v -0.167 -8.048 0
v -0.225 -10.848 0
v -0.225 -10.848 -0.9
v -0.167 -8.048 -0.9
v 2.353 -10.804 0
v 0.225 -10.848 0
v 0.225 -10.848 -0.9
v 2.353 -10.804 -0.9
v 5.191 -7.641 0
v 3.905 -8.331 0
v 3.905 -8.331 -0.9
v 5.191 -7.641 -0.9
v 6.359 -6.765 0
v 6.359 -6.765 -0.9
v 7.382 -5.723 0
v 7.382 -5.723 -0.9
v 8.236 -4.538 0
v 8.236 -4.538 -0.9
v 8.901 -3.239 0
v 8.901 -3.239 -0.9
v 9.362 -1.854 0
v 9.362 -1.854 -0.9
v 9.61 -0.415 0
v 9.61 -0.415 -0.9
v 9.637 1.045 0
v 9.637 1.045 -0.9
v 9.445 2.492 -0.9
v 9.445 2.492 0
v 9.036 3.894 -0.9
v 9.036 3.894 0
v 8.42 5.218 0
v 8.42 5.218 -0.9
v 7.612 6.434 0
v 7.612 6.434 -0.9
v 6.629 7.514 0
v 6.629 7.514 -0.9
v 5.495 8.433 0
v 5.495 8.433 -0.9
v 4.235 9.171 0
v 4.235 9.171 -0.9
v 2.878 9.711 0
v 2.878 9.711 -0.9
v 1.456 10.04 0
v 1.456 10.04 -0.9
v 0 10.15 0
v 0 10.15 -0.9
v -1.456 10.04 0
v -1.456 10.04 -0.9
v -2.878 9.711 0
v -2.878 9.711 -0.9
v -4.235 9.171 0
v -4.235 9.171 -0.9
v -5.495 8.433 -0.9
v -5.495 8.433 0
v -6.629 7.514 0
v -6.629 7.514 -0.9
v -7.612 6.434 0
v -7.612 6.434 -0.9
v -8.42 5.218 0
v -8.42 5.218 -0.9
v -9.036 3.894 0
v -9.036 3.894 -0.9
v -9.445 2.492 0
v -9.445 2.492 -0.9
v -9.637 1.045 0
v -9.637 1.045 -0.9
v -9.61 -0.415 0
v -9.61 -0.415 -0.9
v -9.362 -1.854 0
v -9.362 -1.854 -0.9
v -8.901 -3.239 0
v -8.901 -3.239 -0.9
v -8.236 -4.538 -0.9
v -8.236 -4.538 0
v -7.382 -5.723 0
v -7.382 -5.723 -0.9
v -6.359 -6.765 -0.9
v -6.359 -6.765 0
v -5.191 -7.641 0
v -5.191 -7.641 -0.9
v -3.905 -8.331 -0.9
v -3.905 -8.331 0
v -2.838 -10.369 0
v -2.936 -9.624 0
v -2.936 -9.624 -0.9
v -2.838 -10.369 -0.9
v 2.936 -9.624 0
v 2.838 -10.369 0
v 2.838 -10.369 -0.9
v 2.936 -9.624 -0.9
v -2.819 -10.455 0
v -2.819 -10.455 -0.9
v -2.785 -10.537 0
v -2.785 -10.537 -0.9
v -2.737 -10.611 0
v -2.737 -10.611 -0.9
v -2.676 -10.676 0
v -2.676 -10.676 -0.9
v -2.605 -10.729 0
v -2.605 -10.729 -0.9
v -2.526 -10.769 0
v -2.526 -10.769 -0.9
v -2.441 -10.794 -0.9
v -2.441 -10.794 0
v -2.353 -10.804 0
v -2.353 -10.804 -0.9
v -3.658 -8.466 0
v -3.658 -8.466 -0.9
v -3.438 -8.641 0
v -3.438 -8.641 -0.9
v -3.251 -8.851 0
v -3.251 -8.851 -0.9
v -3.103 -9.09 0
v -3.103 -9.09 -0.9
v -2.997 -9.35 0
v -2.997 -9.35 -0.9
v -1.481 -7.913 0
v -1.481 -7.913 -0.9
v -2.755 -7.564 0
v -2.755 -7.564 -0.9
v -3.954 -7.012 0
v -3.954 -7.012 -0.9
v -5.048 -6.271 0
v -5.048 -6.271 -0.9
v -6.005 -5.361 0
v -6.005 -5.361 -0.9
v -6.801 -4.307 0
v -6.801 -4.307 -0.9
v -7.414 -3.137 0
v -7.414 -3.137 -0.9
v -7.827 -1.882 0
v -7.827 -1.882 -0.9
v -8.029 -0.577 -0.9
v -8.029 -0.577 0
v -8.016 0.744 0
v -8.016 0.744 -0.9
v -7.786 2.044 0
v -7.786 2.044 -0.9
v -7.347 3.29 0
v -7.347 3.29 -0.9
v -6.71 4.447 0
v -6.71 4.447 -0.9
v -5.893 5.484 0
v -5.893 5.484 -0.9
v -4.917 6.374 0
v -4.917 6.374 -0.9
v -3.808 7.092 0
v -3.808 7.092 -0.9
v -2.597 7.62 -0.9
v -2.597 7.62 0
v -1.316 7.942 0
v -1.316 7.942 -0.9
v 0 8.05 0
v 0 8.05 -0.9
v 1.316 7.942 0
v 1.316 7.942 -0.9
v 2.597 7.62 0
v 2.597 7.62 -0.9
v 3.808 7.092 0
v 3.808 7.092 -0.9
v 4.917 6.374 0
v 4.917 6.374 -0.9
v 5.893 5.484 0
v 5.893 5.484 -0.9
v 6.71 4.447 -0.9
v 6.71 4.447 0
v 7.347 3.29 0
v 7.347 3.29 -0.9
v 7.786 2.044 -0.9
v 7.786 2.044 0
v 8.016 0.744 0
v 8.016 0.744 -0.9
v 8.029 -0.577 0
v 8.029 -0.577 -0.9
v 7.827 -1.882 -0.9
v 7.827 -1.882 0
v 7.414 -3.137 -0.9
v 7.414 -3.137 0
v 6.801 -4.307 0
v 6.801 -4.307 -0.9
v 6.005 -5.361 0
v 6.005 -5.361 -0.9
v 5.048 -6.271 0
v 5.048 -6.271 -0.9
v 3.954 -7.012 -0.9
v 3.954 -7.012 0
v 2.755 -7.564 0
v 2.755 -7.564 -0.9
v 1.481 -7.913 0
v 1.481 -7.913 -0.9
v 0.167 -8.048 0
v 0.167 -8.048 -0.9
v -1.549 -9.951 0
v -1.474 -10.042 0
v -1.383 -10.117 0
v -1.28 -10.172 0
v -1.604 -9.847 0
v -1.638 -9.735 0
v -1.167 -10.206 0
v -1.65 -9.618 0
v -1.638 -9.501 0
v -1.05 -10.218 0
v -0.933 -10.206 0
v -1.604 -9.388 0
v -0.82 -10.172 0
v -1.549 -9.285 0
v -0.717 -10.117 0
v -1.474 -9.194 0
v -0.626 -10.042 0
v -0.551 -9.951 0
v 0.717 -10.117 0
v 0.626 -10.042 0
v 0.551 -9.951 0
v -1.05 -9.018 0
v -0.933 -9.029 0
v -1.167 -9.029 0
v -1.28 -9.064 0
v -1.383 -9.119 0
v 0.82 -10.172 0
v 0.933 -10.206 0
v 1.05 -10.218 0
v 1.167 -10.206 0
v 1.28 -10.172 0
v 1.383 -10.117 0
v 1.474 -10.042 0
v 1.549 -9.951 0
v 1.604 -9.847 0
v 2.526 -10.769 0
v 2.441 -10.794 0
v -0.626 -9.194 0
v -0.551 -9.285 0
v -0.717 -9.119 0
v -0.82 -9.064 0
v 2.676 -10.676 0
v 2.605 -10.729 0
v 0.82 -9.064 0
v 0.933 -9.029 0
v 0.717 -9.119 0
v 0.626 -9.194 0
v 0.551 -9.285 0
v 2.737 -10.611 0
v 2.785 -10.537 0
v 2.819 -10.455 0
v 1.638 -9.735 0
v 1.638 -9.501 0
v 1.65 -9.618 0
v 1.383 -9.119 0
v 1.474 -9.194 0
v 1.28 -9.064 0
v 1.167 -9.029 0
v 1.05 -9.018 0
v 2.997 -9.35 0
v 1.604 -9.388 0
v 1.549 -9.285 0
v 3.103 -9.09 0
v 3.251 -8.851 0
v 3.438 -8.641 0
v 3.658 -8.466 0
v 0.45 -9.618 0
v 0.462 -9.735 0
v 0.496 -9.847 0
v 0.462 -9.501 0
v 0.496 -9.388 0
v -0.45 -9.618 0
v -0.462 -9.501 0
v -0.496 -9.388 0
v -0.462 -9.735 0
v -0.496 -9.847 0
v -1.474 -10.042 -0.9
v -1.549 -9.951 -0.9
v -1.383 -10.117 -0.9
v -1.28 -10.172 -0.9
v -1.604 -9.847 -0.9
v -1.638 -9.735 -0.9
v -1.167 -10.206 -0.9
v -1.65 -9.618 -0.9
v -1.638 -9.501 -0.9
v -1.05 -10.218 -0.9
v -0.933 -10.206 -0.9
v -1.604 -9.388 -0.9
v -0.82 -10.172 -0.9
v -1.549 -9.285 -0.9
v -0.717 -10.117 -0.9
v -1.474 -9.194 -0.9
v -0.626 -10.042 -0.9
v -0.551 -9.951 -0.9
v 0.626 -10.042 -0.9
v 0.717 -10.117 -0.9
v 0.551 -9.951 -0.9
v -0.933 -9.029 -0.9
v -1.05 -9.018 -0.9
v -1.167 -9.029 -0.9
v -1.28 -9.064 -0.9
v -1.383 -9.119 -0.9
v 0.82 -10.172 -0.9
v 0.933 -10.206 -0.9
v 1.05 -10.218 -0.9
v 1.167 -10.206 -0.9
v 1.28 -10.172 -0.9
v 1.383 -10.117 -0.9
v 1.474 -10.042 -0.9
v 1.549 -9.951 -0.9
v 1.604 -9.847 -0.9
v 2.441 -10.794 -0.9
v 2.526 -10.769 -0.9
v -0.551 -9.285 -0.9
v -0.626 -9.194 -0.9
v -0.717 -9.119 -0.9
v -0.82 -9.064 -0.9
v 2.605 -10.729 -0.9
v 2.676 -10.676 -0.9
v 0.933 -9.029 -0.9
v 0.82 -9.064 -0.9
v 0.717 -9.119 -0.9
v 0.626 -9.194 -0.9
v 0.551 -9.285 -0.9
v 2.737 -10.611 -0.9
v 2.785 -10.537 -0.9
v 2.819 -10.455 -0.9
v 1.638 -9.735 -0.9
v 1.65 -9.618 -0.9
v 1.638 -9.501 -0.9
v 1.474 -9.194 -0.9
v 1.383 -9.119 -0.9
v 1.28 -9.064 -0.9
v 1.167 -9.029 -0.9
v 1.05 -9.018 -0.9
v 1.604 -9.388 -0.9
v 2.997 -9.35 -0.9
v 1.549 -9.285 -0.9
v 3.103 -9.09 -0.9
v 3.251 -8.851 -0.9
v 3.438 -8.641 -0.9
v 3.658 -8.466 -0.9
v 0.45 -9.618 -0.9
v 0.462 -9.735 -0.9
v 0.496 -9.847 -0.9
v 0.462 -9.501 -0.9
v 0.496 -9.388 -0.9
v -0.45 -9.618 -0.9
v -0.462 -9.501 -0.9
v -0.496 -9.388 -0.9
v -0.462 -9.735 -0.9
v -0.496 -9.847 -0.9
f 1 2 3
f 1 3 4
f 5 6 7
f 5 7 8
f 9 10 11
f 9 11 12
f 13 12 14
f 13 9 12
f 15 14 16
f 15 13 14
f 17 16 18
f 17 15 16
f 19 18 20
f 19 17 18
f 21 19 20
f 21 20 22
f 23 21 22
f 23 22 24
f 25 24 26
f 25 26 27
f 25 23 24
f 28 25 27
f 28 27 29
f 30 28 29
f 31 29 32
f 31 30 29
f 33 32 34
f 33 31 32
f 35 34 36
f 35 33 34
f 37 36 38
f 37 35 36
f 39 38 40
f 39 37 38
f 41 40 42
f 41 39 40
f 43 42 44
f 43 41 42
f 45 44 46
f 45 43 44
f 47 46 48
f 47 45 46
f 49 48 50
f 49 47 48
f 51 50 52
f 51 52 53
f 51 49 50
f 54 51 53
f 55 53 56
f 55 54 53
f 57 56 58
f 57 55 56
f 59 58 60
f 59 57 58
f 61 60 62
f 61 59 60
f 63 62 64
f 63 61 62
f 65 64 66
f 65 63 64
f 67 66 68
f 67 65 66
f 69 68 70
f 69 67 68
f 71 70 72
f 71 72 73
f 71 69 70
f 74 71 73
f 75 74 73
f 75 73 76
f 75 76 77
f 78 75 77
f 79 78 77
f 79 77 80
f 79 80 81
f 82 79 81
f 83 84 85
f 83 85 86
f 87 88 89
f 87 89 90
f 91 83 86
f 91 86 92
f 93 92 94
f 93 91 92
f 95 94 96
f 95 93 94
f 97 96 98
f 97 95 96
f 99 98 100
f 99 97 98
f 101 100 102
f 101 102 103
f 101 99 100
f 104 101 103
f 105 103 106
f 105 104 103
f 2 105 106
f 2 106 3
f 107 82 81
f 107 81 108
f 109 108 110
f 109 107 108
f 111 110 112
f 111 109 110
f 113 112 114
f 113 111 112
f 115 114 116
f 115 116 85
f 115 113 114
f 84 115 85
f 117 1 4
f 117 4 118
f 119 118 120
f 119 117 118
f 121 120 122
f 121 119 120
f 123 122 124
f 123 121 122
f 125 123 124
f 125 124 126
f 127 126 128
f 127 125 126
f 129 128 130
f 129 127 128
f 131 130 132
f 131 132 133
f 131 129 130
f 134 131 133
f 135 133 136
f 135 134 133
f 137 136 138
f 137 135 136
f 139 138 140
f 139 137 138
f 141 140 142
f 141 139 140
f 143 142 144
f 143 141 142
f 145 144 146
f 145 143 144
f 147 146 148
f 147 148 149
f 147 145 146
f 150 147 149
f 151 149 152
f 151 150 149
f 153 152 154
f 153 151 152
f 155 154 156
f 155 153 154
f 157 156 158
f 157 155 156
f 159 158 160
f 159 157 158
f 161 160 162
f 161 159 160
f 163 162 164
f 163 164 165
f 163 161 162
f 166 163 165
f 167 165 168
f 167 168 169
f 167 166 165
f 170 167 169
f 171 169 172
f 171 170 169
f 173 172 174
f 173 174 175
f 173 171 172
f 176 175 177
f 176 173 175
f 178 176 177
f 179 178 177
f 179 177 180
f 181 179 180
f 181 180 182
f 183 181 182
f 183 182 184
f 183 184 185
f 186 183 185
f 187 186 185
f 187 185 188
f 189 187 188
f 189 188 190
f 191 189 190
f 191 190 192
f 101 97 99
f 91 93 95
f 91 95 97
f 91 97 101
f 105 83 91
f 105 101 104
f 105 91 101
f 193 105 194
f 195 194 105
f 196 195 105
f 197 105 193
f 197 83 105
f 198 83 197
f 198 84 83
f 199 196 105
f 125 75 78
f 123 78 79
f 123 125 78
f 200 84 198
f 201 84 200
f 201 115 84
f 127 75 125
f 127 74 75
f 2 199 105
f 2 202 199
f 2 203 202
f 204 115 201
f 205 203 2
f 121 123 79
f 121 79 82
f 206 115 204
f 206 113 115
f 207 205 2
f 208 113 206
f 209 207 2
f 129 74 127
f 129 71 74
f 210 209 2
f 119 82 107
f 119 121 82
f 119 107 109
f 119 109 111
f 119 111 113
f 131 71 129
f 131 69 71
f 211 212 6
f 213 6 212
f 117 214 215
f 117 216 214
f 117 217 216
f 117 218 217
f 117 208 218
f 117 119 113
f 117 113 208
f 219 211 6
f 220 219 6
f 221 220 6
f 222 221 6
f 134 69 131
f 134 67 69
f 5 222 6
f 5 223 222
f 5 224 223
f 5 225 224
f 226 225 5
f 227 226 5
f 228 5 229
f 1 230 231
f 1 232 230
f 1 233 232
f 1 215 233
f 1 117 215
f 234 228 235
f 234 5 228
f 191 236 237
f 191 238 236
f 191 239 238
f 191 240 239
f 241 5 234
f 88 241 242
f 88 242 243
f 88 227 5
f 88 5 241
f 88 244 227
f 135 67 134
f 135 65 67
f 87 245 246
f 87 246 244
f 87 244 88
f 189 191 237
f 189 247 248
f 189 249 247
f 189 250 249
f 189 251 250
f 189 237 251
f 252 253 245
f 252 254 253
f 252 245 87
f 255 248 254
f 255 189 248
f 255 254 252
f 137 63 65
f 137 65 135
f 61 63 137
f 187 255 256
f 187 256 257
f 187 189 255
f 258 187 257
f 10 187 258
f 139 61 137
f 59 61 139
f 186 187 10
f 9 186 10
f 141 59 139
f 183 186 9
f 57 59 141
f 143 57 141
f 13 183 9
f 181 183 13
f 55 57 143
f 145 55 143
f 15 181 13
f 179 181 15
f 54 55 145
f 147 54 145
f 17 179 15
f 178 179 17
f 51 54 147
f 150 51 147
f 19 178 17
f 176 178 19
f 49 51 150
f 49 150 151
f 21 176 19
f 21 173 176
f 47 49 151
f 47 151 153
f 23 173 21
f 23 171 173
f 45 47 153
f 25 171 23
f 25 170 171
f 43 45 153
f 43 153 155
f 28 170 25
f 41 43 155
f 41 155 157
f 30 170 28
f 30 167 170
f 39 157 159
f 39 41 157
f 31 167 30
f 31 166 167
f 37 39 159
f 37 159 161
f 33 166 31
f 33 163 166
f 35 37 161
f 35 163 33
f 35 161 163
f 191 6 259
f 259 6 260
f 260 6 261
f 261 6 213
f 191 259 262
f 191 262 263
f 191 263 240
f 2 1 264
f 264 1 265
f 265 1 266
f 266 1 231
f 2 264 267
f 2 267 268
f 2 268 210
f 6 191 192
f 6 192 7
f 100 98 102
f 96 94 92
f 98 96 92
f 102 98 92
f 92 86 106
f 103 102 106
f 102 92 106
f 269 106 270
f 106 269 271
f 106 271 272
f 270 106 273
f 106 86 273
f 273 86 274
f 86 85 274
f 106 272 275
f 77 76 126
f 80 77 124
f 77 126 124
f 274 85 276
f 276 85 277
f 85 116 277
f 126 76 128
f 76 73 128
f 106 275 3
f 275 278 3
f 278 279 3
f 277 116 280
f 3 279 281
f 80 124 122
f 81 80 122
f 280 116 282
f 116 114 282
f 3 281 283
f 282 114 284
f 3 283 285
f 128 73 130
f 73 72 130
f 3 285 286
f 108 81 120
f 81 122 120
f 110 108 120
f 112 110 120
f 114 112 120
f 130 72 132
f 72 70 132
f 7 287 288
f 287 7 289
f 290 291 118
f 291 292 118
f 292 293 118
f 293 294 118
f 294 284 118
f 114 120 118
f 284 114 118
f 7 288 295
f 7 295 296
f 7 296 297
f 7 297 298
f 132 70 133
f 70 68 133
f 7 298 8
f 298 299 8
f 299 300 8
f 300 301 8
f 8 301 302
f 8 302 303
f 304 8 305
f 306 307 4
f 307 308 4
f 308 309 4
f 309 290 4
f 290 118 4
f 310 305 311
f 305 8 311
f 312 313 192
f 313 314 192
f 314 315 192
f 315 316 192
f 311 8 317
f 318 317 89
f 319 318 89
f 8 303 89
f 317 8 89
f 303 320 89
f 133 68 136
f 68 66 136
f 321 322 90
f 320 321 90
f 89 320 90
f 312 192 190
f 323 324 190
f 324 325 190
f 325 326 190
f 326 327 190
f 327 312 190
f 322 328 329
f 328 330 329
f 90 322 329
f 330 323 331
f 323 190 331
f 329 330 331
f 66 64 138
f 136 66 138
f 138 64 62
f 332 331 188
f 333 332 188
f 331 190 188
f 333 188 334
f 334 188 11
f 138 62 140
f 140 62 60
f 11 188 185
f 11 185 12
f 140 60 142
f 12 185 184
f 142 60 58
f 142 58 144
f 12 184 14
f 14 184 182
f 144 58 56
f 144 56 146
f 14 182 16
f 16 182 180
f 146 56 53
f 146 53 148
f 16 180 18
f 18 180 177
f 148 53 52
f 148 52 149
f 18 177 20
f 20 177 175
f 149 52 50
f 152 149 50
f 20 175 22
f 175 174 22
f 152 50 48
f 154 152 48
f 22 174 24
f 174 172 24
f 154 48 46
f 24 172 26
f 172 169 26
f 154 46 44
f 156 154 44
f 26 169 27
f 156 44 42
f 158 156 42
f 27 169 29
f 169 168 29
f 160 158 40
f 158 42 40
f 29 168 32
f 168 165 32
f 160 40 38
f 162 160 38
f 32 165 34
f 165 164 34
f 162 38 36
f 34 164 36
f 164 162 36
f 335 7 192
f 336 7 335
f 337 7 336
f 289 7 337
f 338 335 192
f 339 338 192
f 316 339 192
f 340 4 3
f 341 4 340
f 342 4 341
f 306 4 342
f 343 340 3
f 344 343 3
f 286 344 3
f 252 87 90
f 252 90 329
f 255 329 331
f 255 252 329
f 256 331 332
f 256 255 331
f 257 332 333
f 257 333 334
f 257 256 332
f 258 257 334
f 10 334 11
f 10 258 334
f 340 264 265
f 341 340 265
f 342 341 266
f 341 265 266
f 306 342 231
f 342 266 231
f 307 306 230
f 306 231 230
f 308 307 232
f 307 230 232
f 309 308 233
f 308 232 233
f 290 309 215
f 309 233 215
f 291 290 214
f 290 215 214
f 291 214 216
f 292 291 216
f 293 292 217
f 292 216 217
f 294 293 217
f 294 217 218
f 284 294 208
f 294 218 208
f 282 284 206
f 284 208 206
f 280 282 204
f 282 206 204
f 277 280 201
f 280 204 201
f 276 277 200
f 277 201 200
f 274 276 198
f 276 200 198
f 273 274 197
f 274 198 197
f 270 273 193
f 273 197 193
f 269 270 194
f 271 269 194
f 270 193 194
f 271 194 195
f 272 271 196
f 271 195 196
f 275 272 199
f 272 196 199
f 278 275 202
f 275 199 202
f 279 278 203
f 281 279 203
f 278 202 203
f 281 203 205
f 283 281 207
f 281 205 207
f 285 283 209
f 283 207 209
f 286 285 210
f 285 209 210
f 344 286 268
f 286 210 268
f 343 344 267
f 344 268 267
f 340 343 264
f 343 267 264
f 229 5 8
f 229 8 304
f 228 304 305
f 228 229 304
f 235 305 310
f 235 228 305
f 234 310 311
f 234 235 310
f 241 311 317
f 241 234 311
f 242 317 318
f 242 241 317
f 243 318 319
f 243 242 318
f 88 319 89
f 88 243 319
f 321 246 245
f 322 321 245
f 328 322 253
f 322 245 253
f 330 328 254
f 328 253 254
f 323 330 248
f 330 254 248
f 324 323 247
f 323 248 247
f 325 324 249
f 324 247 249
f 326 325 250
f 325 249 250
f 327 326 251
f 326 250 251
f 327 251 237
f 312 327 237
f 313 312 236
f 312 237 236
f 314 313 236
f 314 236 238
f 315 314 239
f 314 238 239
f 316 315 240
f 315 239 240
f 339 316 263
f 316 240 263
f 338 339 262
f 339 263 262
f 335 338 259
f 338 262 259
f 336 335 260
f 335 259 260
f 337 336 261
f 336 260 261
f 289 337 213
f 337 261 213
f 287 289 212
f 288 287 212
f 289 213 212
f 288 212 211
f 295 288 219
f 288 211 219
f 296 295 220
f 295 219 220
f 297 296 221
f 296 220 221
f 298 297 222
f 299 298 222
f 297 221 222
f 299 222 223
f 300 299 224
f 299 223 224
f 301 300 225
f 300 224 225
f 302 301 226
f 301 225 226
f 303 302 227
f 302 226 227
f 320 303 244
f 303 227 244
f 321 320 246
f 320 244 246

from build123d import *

# Parameters (mm, degrees)
BODYSKE_R  = 0.6
BODY_DEPTH = 0.9


with BuildPart() as part:
    # BodySke → Body (new body)
    with BuildSketch(Plane.XY):
        with BuildLine():
            Line((0.166935484, -8.048268916), (0.225, -10.8476668))
            Line((0.225, -10.8476668), (2.353032971, -10.803527592))
            ThreePointArc((2.353032971, -10.803527592), (2.676217488, -10.676116355), (2.838386738, -10.368898209))
            Line((2.838386738, -10.368898209), (2.936405186, -9.624374178))
            ThreePointArc((2.936405186, -9.624374178), (3.251364406, -8.851047556), (3.904664808, -8.331016828))
            ThreePointArc((3.904664808, -8.331016828), (0, 10.15), (-3.904664808, -8.331016828))
            ThreePointArc((-3.904664808, -8.331016828), (-3.251364406, -8.851047556), (-2.936405186, -9.624374178))
            Line((-2.936405186, -9.624374178), (-2.838386738, -10.368898209))
            ThreePointArc((-2.838386738, -10.368898209), (-2.676217488, -10.676116355), (-2.353032971, -10.803527592))
            Line((-2.353032971, -10.803527592), (-0.225, -10.8476668))
            Line((-0.225, -10.8476668), (-0.166935484, -8.048268916))
            ThreePointArc((-0.166935484, -8.048268916), (0, 8.05), (0.166935484, -8.048268916))
        make_face()
        with Locations((1.05, -9.61785449)):
            Circle(BODYSKE_R, mode=Mode.SUBTRACT)
        with Locations((-1.05, -9.61785449)):
            Circle(BODYSKE_R, mode=Mode.SUBTRACT)
    extrude(amount=-BODY_DEPTH)


solid = part.part
